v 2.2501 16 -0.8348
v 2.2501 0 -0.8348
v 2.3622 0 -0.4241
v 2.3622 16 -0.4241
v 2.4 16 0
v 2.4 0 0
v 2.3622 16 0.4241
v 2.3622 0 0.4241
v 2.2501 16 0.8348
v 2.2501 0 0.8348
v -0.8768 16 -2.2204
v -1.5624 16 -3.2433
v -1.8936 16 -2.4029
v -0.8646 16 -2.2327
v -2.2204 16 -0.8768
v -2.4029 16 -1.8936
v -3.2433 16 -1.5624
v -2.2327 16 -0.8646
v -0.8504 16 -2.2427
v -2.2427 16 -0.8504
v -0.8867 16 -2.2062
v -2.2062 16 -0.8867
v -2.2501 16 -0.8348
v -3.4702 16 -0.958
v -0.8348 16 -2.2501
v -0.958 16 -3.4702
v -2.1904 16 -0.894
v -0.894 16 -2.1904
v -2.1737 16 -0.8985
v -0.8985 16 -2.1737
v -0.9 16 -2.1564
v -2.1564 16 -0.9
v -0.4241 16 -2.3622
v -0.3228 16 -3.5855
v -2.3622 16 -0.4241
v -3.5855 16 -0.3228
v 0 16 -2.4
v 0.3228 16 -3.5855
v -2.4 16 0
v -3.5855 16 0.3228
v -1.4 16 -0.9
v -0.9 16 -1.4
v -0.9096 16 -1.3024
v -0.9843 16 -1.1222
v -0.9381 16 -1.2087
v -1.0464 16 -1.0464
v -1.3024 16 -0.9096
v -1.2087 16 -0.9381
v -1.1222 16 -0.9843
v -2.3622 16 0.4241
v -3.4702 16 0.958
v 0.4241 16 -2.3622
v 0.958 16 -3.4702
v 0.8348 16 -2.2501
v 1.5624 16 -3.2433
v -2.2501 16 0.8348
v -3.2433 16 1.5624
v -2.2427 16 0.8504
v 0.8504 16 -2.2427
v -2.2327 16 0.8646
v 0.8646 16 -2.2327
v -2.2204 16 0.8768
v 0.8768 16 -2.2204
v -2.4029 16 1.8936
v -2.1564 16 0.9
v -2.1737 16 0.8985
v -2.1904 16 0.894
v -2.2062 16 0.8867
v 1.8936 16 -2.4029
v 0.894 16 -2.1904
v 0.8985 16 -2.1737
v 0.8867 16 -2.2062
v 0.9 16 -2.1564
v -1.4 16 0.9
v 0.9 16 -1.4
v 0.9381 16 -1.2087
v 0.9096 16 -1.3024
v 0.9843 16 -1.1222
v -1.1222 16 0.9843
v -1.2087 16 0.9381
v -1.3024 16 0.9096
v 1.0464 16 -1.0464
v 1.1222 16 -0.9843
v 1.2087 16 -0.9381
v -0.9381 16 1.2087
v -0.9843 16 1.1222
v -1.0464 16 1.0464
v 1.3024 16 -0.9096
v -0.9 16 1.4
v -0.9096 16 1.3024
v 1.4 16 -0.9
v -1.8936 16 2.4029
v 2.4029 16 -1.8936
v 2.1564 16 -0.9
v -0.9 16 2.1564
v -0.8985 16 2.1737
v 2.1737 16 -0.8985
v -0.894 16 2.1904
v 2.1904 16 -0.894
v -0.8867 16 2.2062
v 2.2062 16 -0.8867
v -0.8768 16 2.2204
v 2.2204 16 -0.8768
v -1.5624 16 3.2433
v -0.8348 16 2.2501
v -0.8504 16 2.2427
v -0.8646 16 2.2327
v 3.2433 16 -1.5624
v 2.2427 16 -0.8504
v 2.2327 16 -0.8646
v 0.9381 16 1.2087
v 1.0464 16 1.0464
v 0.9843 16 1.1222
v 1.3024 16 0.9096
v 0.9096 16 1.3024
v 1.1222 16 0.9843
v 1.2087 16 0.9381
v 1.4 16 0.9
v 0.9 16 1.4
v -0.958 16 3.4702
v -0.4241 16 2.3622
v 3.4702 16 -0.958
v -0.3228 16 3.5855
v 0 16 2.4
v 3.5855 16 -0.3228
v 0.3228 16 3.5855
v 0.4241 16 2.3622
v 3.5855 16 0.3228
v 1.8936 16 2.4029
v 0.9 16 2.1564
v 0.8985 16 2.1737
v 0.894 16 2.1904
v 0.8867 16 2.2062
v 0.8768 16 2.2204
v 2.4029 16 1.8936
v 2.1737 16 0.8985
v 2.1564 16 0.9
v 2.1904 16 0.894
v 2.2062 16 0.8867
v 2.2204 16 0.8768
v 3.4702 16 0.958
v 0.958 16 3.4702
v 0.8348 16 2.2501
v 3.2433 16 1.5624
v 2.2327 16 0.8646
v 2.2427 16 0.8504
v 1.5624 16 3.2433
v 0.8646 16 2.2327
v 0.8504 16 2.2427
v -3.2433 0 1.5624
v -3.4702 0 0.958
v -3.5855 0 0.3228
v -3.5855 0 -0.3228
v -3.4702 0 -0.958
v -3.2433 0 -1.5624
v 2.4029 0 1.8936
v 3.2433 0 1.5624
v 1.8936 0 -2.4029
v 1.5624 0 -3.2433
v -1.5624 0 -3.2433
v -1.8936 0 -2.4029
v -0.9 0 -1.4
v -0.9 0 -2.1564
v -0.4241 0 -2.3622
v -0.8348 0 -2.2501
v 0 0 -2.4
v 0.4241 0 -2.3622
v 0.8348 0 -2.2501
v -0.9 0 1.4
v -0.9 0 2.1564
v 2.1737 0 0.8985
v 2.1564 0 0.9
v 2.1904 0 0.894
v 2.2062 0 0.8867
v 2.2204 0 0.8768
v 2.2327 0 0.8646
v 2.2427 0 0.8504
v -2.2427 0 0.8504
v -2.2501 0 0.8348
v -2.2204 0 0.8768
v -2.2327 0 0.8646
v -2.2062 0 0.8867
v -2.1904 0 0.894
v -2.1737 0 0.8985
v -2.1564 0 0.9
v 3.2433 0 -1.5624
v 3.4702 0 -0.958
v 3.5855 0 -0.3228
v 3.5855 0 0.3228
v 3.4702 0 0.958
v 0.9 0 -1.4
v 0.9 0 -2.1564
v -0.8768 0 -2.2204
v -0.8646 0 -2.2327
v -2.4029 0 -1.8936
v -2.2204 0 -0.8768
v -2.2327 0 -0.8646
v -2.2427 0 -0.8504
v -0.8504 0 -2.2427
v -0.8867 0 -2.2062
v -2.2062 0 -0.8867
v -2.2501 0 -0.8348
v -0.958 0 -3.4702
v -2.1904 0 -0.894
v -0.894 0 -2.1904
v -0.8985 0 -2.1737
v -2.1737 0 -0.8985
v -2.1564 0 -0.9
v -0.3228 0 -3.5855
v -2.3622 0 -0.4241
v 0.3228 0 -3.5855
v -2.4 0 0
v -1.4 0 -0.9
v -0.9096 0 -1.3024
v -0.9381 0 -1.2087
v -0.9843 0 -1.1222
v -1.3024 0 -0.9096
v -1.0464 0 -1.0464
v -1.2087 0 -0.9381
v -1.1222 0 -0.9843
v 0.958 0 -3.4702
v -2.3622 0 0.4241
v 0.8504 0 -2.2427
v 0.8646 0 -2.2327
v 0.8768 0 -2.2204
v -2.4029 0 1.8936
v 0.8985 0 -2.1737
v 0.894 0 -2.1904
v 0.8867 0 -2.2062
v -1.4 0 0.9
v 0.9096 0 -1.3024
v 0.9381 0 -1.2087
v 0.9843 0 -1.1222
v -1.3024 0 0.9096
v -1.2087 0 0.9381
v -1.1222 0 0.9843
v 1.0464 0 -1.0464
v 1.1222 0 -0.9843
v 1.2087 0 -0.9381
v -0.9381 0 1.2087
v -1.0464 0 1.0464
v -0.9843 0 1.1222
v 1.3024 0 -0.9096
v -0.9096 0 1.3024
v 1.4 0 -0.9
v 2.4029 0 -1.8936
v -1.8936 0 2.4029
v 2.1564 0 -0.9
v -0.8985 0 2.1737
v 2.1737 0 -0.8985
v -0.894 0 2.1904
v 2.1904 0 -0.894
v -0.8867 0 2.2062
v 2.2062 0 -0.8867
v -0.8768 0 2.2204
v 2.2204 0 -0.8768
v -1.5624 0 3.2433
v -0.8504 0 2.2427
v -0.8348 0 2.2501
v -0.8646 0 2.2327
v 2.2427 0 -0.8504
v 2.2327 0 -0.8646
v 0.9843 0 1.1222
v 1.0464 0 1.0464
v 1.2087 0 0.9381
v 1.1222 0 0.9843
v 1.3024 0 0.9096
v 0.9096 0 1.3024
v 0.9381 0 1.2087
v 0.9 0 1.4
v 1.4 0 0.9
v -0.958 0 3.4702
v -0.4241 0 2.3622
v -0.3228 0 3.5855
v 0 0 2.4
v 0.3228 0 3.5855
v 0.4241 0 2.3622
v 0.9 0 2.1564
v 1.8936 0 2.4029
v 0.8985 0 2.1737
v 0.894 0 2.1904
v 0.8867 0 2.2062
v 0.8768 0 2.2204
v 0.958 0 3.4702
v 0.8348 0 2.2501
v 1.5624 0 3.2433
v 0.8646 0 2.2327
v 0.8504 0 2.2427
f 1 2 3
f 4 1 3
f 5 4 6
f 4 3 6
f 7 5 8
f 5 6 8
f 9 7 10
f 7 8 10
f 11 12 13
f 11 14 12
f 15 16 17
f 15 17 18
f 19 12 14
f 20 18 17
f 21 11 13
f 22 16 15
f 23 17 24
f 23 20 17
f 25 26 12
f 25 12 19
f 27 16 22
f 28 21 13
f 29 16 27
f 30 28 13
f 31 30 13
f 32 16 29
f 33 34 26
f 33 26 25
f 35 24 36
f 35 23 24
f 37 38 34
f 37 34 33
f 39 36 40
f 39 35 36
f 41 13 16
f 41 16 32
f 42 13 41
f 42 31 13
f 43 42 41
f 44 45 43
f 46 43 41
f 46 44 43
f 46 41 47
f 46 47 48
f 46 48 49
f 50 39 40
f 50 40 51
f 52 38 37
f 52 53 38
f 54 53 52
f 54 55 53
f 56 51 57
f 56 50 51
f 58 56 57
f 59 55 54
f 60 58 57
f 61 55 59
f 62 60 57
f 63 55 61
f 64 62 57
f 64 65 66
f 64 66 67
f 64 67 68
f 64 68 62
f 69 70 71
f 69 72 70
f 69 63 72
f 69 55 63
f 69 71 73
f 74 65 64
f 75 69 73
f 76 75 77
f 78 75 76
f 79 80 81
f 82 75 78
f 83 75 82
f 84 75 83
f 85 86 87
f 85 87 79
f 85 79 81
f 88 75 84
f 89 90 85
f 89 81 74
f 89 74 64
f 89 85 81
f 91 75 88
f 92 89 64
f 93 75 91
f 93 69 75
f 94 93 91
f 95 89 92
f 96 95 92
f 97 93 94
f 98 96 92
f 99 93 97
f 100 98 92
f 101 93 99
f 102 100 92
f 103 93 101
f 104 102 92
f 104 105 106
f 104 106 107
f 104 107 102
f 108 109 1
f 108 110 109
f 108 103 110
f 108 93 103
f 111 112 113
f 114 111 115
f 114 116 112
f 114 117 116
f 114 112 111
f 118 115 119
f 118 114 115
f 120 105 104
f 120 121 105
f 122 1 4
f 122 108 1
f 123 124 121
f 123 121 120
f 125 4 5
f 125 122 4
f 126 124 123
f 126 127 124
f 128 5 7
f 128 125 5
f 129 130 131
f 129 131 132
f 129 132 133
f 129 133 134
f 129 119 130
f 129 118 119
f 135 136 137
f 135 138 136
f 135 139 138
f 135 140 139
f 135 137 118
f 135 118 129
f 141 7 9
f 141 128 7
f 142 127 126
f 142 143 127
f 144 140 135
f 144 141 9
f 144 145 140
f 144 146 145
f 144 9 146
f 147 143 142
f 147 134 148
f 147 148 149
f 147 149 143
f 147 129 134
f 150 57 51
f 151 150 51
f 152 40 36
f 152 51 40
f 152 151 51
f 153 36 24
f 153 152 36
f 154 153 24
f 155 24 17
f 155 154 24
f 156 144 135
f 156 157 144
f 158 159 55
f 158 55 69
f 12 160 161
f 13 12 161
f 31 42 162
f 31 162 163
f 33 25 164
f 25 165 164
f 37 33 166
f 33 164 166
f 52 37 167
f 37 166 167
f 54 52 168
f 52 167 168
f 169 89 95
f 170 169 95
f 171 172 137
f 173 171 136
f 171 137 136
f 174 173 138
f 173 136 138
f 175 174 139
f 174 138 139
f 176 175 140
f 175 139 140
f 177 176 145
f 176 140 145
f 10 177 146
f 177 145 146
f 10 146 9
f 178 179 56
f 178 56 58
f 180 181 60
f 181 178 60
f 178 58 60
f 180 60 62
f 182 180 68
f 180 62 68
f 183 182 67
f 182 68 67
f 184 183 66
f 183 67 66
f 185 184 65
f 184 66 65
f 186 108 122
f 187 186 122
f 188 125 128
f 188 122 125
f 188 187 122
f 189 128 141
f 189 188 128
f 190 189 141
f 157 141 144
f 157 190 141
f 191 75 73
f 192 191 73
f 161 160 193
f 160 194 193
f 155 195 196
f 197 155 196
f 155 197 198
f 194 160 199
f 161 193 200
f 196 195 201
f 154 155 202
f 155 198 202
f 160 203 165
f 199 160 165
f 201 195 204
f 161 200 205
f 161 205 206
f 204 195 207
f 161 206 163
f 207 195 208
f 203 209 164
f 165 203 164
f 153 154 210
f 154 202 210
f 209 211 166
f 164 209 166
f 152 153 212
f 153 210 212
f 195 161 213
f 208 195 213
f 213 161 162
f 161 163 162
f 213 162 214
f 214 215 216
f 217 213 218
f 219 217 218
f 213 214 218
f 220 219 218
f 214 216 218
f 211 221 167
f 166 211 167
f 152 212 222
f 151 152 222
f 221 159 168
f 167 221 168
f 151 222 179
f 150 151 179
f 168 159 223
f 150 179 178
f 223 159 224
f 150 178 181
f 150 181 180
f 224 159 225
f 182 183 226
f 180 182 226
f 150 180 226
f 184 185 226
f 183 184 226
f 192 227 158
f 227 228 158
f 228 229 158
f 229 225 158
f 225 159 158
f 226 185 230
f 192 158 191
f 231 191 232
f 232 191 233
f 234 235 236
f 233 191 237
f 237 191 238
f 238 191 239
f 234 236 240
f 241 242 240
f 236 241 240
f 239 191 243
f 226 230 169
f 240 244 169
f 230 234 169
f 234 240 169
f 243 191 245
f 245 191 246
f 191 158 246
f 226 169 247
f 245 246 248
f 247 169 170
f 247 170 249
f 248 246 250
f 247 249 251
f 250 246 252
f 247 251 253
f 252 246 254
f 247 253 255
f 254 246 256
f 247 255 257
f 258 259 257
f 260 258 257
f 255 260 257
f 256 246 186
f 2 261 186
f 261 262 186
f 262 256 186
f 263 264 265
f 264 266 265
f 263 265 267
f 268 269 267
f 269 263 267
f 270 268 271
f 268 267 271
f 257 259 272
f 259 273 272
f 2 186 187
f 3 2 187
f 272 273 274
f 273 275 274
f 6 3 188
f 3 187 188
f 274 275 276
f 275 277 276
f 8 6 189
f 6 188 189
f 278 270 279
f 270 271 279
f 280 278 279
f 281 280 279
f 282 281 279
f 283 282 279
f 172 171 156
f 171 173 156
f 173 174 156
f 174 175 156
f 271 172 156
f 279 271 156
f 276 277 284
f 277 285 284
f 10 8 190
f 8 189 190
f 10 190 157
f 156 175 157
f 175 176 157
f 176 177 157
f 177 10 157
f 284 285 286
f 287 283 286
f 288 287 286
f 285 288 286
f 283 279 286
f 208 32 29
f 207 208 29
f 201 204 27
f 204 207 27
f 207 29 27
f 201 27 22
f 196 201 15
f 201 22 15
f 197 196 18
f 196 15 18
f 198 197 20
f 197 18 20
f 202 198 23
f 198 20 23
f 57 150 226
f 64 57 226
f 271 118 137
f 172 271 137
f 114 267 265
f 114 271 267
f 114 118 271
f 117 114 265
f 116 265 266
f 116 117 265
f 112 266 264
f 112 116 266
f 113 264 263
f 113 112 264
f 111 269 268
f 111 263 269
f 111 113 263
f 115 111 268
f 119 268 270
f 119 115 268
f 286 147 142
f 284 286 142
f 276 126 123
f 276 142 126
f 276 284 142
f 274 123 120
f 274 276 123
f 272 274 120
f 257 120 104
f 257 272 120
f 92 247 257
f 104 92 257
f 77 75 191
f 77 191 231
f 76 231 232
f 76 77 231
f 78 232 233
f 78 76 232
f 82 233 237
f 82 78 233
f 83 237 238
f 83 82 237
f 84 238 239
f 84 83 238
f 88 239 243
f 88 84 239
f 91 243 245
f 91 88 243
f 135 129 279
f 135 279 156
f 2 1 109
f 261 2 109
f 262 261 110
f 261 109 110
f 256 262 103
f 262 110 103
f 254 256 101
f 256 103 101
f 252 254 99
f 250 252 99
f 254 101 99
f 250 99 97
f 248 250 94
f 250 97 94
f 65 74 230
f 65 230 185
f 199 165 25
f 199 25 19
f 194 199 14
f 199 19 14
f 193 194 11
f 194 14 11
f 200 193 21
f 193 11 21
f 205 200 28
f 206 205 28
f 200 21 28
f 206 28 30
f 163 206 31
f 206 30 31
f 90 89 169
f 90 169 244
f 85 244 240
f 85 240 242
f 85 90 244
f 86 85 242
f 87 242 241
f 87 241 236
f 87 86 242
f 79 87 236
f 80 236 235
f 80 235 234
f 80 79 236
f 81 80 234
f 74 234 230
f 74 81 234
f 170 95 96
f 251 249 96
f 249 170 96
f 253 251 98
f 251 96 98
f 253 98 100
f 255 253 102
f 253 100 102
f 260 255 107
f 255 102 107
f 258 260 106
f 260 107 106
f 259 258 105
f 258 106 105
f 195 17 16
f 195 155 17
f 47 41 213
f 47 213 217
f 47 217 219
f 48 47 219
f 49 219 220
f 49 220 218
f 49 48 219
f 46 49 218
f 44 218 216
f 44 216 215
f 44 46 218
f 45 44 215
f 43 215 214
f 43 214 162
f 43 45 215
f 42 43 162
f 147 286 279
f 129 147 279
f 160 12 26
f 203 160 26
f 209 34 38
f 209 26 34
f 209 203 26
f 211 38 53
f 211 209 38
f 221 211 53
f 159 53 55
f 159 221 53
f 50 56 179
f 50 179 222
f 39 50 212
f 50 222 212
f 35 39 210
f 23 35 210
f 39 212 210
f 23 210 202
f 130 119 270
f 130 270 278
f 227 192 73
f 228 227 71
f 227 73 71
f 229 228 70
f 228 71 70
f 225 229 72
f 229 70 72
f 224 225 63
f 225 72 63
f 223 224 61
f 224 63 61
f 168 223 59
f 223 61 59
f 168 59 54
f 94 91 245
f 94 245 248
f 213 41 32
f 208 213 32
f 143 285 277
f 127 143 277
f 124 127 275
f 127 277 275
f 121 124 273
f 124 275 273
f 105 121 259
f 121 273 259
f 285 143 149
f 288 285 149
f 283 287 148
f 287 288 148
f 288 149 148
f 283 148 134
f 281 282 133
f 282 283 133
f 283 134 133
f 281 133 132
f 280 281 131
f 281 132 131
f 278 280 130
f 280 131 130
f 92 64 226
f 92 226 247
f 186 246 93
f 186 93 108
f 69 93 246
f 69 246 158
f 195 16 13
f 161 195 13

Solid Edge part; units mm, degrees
sketch "Sketch1" plane through (0, 0, 0) normal (0, -1, 0) x (1, 0, 0)
  line L0 (0.9, 0.9) -> (0.9, 2.2249)
  arc A0 (-0.9, 2.2249) -> (0.9, 2.2249) centre (0, 0) cw
  line L1 (-0.9, 0.9) -> (-0.9, 2.2249)
  line L2 (-0.9, 0.9) -> (-2.2249, 0.9)
  line L3 (-0.9, -0.9) -> (-2.2249, -0.9)
  line L4 (-0.9, -0.9) -> (-0.9, -2.2249)
  arc A1 (0.9, -2.2249) -> (-0.9, -2.2249) centre (0, 0) cw
  line L5 (0.9, -0.9) -> (0.9, -2.2249)
  line L6 (0.9, -0.9) -> (2.2249, -0.9)
  arc A2 (2.2249, 0.9) -> (2.2249, -0.9) centre (0, 0) cw
  line L7 (0.9, 0.9) -> (2.2249, 0.9)
  arc A3 (-2.2249, 0.9) -> (-2.2249, -0.9) centre (0, 0) ccw
  line L8 (1.5624, 3.2433) -> (1.8936, 2.4029)
  line L9 (1.8936, 2.4029) -> (2.4029, 1.8936)
  line L10 (3.2433, 1.5624) -> (2.4029, 1.8936)
  arc A4 (3.2433, 1.5624) -> (3.2433, -1.5624) centre (0, 0) cw
  line L11 (2.4029, -1.8936) -> (3.2433, -1.5624)
  line L12 (2.4029, -1.8936) -> (1.8936, -2.4029)
  line L13 (1.5624, -3.2433) -> (1.8936, -2.4029)
  line L14 (-1.5624, -3.2433) -> (-1.8936, -2.4029)
  line L15 (-2.4029, -1.8936) -> (-1.8936, -2.4029)
  line L16 (-3.2433, -1.5624) -> (-2.4029, -1.8936)
  arc A5 (-3.2433, -1.5624) -> (-3.2433, 1.5624) centre (0, 0) cw
  line L17 (-3.2433, 1.5624) -> (-2.4029, 1.8936)
  line L18 (-2.4029, 1.8936) -> (-1.8936, 2.4029)
  line L19 (-1.8936, 2.4029) -> (-1.5624, 3.2433)
  arc A6 (-1.5624, 3.2433) -> (1.5624, 3.2433) centre (0, 0) cw
  arc A7 (1.5624, -3.2433) -> (-1.5624, -3.2433) centre (0, 0) cw
extrude "Protrusion1" add sketch "Sketch1" against normal blind 16
fillet "Round_1" radius 0.5 4 edges at (-0.9, 8, 0.9) (0.9, 8, 0.9) (-0.9, 8, -0.9) (0.9, 8, -0.9)
fillet "Round_2" radius 0.1 8 edges at (-0.9, 8, 2.2249) (0.9, 8, 2.2249) (2.2249, 8, 0.9) (2.2249, 8, -0.9) (0.9, 8, -2.2249) (-0.9, 8, -2.2249) (-2.2249, 8, -0.9) (-2.2249, 8, 0.9)
